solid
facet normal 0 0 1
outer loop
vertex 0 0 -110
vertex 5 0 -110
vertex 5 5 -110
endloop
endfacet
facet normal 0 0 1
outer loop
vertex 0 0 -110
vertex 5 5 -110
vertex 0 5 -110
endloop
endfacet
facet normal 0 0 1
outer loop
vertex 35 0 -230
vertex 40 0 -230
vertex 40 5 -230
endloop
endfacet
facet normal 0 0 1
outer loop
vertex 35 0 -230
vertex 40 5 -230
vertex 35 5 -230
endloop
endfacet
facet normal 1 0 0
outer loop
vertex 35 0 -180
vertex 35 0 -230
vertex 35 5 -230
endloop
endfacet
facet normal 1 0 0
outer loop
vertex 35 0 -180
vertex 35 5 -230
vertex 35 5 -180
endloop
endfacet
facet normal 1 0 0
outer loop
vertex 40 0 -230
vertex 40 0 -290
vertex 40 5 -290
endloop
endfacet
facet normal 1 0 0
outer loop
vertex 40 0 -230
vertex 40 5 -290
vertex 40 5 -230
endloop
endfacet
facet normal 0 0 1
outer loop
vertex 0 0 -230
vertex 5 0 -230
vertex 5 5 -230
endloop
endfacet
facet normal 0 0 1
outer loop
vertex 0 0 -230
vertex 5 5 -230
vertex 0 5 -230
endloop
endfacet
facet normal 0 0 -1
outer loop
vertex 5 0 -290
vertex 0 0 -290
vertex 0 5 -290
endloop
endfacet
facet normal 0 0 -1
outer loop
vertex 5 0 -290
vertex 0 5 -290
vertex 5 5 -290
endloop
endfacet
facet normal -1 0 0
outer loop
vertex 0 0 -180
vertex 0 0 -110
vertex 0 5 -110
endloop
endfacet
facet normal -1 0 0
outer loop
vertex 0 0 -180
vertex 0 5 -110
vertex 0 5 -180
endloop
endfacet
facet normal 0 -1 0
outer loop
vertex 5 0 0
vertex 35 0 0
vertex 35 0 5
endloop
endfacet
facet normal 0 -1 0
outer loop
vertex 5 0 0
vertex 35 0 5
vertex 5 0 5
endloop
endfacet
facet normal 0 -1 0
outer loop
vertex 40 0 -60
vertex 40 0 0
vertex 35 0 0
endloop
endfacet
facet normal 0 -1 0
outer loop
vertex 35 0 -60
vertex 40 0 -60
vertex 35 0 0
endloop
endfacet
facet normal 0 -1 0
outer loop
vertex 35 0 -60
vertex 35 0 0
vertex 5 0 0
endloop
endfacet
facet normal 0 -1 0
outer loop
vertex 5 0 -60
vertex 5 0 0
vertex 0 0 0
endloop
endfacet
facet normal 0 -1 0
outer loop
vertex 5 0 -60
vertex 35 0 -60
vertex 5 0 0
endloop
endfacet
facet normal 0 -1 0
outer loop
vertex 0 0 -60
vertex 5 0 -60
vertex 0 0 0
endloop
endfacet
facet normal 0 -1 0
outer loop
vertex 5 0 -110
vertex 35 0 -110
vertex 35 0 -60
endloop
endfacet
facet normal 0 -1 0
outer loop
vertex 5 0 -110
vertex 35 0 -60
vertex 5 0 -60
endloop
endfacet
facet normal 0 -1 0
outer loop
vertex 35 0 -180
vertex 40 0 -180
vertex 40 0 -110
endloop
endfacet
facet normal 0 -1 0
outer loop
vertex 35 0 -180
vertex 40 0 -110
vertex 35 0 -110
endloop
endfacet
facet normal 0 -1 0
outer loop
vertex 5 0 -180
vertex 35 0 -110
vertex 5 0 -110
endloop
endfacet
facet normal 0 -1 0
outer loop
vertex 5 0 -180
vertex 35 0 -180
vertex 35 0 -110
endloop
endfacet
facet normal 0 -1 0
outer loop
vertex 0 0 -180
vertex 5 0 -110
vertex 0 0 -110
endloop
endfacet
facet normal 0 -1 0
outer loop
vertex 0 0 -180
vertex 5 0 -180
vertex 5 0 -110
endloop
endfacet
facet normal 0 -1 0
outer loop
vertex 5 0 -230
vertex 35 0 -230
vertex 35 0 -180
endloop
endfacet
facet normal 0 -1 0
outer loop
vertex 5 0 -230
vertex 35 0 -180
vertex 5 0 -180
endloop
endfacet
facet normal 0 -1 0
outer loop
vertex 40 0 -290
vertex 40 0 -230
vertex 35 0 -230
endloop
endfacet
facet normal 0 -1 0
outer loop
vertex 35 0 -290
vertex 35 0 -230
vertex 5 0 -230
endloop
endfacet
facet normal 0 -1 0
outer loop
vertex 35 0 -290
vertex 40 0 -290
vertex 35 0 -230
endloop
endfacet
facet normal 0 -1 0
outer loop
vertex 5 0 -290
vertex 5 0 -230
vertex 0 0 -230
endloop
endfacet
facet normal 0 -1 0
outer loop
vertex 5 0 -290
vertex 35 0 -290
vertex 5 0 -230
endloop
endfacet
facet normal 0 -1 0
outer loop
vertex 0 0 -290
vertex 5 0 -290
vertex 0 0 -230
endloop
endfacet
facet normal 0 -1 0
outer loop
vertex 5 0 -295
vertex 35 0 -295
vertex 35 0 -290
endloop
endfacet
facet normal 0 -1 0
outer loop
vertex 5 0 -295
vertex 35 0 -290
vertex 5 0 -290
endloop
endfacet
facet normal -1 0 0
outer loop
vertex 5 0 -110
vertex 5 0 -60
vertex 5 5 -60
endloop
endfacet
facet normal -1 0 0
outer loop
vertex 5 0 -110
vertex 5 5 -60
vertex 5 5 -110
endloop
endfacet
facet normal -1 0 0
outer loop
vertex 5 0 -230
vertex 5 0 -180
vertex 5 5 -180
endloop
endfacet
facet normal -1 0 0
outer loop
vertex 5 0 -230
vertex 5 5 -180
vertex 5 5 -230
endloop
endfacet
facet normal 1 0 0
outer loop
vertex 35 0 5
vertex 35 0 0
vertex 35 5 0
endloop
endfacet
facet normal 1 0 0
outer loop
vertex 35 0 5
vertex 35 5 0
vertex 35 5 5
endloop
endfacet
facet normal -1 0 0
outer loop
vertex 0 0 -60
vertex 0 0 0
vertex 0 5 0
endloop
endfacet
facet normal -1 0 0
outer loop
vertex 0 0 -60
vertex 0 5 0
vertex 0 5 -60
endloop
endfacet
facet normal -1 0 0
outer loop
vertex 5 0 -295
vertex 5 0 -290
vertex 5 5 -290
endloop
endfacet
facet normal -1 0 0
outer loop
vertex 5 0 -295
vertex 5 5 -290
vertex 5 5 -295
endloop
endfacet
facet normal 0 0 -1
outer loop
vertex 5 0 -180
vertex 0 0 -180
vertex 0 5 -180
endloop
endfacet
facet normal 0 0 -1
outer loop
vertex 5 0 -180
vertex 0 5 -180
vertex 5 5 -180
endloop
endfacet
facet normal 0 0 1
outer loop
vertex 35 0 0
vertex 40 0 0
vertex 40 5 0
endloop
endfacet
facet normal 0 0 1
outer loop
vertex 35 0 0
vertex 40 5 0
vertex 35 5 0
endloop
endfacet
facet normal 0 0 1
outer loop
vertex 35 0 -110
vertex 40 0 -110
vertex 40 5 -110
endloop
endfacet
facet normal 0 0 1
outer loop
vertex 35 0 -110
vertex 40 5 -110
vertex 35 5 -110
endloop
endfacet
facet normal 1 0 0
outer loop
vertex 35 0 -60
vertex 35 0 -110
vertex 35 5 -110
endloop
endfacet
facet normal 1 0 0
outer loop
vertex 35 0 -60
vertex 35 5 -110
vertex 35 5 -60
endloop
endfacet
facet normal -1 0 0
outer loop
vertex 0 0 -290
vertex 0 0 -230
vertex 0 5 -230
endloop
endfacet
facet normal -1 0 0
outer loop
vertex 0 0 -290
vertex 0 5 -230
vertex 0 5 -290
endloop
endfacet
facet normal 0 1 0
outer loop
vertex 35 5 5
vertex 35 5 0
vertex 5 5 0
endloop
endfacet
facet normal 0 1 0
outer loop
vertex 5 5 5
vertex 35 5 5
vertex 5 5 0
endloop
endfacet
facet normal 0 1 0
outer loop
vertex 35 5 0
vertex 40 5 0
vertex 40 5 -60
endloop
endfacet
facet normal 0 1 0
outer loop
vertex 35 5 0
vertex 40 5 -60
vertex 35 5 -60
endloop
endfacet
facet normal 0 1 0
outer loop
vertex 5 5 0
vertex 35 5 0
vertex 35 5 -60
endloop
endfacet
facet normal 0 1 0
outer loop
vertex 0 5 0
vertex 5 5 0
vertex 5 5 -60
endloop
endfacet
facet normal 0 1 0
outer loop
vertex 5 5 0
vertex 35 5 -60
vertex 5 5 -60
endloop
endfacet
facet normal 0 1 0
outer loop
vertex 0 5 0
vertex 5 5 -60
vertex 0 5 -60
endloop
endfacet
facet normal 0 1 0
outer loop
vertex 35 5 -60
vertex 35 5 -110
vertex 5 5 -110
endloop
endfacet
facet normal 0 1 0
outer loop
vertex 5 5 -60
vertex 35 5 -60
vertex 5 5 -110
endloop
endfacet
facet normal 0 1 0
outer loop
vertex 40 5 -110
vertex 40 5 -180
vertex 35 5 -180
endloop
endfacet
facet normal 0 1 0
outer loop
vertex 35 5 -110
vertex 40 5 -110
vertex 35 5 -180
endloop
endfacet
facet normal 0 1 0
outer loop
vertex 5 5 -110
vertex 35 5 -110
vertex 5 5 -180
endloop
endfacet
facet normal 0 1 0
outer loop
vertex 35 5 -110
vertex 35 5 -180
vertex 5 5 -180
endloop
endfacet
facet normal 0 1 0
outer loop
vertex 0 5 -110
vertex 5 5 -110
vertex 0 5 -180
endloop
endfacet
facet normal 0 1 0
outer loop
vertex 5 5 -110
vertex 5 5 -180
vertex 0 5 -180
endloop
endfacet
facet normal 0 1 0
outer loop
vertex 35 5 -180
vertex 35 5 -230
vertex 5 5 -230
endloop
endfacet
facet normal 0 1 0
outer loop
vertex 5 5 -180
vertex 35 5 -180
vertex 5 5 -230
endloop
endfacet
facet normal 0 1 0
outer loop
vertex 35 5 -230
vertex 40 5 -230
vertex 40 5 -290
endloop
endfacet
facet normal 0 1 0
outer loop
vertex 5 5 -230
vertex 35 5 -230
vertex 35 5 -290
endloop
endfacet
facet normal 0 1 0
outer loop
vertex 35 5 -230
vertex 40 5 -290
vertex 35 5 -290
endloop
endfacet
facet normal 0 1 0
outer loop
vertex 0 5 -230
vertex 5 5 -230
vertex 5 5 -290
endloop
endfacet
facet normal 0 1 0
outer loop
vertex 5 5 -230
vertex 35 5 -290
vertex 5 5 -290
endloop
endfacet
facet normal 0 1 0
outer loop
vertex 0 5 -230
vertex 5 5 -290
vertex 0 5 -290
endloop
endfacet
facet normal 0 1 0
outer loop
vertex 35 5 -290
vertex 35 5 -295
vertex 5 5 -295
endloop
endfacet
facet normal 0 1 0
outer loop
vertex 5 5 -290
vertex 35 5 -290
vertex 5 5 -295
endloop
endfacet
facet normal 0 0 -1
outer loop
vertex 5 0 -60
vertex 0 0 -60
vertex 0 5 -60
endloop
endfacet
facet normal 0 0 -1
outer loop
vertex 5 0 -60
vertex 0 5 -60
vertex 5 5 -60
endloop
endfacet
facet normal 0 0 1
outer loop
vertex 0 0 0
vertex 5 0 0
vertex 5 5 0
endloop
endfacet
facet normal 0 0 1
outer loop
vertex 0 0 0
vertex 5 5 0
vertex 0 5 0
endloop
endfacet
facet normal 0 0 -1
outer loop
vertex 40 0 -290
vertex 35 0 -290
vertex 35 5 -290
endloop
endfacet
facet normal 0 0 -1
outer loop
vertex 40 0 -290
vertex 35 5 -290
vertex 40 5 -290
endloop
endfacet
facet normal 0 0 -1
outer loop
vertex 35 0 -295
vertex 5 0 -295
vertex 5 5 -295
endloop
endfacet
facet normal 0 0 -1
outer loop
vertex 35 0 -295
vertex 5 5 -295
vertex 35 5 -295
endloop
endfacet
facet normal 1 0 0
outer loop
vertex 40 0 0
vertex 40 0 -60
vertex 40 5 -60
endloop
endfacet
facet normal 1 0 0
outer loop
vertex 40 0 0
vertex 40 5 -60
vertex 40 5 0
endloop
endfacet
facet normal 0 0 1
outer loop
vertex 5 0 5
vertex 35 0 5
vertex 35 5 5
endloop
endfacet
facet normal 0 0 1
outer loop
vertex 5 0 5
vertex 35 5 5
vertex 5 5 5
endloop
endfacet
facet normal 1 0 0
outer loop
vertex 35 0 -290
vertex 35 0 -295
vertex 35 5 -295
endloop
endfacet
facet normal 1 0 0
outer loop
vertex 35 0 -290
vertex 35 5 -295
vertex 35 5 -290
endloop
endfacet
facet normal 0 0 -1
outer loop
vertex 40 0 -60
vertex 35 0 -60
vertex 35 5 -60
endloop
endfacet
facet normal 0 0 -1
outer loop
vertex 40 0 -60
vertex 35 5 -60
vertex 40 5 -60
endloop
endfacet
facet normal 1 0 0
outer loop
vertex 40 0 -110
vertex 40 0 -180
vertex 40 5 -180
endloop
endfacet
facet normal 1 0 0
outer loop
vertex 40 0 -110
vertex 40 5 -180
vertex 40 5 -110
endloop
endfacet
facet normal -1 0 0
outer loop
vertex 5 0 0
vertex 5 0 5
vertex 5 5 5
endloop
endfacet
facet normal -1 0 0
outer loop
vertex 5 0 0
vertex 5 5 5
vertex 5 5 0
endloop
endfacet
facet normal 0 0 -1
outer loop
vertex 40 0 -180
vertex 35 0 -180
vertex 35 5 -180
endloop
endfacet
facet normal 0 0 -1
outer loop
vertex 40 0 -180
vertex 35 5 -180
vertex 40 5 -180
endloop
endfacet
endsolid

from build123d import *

# Parameters (mm, degrees)
EXTRUDE_1_DEPTH = 5


with BuildPart() as part:
    # 草图1 → 凸台-拉伸1 (new body)
    with BuildSketch(Plane(origin=(0, 0, 0), x_dir=(1, 0, 0), z_dir=(0, 1, 0))):
        Polygon((35, 290), (40, 290), (40, 230), (35, 230), (35, 180), (40, 180), (40, 110), (35, 110), (35, 60), (40, 60), (40, 0), (35, 0), (35, -5), (5, -5), (5, 0), (0, 0), (0, 60), (5, 60), (5, 110), (0, 110), (0, 180), (5, 180), (5, 230), (0, 230), (0, 290), (5, 290), (5, 295), (35, 295), align=None)
    extrude(amount=EXTRUDE_1_DEPTH)


solid = part.part
